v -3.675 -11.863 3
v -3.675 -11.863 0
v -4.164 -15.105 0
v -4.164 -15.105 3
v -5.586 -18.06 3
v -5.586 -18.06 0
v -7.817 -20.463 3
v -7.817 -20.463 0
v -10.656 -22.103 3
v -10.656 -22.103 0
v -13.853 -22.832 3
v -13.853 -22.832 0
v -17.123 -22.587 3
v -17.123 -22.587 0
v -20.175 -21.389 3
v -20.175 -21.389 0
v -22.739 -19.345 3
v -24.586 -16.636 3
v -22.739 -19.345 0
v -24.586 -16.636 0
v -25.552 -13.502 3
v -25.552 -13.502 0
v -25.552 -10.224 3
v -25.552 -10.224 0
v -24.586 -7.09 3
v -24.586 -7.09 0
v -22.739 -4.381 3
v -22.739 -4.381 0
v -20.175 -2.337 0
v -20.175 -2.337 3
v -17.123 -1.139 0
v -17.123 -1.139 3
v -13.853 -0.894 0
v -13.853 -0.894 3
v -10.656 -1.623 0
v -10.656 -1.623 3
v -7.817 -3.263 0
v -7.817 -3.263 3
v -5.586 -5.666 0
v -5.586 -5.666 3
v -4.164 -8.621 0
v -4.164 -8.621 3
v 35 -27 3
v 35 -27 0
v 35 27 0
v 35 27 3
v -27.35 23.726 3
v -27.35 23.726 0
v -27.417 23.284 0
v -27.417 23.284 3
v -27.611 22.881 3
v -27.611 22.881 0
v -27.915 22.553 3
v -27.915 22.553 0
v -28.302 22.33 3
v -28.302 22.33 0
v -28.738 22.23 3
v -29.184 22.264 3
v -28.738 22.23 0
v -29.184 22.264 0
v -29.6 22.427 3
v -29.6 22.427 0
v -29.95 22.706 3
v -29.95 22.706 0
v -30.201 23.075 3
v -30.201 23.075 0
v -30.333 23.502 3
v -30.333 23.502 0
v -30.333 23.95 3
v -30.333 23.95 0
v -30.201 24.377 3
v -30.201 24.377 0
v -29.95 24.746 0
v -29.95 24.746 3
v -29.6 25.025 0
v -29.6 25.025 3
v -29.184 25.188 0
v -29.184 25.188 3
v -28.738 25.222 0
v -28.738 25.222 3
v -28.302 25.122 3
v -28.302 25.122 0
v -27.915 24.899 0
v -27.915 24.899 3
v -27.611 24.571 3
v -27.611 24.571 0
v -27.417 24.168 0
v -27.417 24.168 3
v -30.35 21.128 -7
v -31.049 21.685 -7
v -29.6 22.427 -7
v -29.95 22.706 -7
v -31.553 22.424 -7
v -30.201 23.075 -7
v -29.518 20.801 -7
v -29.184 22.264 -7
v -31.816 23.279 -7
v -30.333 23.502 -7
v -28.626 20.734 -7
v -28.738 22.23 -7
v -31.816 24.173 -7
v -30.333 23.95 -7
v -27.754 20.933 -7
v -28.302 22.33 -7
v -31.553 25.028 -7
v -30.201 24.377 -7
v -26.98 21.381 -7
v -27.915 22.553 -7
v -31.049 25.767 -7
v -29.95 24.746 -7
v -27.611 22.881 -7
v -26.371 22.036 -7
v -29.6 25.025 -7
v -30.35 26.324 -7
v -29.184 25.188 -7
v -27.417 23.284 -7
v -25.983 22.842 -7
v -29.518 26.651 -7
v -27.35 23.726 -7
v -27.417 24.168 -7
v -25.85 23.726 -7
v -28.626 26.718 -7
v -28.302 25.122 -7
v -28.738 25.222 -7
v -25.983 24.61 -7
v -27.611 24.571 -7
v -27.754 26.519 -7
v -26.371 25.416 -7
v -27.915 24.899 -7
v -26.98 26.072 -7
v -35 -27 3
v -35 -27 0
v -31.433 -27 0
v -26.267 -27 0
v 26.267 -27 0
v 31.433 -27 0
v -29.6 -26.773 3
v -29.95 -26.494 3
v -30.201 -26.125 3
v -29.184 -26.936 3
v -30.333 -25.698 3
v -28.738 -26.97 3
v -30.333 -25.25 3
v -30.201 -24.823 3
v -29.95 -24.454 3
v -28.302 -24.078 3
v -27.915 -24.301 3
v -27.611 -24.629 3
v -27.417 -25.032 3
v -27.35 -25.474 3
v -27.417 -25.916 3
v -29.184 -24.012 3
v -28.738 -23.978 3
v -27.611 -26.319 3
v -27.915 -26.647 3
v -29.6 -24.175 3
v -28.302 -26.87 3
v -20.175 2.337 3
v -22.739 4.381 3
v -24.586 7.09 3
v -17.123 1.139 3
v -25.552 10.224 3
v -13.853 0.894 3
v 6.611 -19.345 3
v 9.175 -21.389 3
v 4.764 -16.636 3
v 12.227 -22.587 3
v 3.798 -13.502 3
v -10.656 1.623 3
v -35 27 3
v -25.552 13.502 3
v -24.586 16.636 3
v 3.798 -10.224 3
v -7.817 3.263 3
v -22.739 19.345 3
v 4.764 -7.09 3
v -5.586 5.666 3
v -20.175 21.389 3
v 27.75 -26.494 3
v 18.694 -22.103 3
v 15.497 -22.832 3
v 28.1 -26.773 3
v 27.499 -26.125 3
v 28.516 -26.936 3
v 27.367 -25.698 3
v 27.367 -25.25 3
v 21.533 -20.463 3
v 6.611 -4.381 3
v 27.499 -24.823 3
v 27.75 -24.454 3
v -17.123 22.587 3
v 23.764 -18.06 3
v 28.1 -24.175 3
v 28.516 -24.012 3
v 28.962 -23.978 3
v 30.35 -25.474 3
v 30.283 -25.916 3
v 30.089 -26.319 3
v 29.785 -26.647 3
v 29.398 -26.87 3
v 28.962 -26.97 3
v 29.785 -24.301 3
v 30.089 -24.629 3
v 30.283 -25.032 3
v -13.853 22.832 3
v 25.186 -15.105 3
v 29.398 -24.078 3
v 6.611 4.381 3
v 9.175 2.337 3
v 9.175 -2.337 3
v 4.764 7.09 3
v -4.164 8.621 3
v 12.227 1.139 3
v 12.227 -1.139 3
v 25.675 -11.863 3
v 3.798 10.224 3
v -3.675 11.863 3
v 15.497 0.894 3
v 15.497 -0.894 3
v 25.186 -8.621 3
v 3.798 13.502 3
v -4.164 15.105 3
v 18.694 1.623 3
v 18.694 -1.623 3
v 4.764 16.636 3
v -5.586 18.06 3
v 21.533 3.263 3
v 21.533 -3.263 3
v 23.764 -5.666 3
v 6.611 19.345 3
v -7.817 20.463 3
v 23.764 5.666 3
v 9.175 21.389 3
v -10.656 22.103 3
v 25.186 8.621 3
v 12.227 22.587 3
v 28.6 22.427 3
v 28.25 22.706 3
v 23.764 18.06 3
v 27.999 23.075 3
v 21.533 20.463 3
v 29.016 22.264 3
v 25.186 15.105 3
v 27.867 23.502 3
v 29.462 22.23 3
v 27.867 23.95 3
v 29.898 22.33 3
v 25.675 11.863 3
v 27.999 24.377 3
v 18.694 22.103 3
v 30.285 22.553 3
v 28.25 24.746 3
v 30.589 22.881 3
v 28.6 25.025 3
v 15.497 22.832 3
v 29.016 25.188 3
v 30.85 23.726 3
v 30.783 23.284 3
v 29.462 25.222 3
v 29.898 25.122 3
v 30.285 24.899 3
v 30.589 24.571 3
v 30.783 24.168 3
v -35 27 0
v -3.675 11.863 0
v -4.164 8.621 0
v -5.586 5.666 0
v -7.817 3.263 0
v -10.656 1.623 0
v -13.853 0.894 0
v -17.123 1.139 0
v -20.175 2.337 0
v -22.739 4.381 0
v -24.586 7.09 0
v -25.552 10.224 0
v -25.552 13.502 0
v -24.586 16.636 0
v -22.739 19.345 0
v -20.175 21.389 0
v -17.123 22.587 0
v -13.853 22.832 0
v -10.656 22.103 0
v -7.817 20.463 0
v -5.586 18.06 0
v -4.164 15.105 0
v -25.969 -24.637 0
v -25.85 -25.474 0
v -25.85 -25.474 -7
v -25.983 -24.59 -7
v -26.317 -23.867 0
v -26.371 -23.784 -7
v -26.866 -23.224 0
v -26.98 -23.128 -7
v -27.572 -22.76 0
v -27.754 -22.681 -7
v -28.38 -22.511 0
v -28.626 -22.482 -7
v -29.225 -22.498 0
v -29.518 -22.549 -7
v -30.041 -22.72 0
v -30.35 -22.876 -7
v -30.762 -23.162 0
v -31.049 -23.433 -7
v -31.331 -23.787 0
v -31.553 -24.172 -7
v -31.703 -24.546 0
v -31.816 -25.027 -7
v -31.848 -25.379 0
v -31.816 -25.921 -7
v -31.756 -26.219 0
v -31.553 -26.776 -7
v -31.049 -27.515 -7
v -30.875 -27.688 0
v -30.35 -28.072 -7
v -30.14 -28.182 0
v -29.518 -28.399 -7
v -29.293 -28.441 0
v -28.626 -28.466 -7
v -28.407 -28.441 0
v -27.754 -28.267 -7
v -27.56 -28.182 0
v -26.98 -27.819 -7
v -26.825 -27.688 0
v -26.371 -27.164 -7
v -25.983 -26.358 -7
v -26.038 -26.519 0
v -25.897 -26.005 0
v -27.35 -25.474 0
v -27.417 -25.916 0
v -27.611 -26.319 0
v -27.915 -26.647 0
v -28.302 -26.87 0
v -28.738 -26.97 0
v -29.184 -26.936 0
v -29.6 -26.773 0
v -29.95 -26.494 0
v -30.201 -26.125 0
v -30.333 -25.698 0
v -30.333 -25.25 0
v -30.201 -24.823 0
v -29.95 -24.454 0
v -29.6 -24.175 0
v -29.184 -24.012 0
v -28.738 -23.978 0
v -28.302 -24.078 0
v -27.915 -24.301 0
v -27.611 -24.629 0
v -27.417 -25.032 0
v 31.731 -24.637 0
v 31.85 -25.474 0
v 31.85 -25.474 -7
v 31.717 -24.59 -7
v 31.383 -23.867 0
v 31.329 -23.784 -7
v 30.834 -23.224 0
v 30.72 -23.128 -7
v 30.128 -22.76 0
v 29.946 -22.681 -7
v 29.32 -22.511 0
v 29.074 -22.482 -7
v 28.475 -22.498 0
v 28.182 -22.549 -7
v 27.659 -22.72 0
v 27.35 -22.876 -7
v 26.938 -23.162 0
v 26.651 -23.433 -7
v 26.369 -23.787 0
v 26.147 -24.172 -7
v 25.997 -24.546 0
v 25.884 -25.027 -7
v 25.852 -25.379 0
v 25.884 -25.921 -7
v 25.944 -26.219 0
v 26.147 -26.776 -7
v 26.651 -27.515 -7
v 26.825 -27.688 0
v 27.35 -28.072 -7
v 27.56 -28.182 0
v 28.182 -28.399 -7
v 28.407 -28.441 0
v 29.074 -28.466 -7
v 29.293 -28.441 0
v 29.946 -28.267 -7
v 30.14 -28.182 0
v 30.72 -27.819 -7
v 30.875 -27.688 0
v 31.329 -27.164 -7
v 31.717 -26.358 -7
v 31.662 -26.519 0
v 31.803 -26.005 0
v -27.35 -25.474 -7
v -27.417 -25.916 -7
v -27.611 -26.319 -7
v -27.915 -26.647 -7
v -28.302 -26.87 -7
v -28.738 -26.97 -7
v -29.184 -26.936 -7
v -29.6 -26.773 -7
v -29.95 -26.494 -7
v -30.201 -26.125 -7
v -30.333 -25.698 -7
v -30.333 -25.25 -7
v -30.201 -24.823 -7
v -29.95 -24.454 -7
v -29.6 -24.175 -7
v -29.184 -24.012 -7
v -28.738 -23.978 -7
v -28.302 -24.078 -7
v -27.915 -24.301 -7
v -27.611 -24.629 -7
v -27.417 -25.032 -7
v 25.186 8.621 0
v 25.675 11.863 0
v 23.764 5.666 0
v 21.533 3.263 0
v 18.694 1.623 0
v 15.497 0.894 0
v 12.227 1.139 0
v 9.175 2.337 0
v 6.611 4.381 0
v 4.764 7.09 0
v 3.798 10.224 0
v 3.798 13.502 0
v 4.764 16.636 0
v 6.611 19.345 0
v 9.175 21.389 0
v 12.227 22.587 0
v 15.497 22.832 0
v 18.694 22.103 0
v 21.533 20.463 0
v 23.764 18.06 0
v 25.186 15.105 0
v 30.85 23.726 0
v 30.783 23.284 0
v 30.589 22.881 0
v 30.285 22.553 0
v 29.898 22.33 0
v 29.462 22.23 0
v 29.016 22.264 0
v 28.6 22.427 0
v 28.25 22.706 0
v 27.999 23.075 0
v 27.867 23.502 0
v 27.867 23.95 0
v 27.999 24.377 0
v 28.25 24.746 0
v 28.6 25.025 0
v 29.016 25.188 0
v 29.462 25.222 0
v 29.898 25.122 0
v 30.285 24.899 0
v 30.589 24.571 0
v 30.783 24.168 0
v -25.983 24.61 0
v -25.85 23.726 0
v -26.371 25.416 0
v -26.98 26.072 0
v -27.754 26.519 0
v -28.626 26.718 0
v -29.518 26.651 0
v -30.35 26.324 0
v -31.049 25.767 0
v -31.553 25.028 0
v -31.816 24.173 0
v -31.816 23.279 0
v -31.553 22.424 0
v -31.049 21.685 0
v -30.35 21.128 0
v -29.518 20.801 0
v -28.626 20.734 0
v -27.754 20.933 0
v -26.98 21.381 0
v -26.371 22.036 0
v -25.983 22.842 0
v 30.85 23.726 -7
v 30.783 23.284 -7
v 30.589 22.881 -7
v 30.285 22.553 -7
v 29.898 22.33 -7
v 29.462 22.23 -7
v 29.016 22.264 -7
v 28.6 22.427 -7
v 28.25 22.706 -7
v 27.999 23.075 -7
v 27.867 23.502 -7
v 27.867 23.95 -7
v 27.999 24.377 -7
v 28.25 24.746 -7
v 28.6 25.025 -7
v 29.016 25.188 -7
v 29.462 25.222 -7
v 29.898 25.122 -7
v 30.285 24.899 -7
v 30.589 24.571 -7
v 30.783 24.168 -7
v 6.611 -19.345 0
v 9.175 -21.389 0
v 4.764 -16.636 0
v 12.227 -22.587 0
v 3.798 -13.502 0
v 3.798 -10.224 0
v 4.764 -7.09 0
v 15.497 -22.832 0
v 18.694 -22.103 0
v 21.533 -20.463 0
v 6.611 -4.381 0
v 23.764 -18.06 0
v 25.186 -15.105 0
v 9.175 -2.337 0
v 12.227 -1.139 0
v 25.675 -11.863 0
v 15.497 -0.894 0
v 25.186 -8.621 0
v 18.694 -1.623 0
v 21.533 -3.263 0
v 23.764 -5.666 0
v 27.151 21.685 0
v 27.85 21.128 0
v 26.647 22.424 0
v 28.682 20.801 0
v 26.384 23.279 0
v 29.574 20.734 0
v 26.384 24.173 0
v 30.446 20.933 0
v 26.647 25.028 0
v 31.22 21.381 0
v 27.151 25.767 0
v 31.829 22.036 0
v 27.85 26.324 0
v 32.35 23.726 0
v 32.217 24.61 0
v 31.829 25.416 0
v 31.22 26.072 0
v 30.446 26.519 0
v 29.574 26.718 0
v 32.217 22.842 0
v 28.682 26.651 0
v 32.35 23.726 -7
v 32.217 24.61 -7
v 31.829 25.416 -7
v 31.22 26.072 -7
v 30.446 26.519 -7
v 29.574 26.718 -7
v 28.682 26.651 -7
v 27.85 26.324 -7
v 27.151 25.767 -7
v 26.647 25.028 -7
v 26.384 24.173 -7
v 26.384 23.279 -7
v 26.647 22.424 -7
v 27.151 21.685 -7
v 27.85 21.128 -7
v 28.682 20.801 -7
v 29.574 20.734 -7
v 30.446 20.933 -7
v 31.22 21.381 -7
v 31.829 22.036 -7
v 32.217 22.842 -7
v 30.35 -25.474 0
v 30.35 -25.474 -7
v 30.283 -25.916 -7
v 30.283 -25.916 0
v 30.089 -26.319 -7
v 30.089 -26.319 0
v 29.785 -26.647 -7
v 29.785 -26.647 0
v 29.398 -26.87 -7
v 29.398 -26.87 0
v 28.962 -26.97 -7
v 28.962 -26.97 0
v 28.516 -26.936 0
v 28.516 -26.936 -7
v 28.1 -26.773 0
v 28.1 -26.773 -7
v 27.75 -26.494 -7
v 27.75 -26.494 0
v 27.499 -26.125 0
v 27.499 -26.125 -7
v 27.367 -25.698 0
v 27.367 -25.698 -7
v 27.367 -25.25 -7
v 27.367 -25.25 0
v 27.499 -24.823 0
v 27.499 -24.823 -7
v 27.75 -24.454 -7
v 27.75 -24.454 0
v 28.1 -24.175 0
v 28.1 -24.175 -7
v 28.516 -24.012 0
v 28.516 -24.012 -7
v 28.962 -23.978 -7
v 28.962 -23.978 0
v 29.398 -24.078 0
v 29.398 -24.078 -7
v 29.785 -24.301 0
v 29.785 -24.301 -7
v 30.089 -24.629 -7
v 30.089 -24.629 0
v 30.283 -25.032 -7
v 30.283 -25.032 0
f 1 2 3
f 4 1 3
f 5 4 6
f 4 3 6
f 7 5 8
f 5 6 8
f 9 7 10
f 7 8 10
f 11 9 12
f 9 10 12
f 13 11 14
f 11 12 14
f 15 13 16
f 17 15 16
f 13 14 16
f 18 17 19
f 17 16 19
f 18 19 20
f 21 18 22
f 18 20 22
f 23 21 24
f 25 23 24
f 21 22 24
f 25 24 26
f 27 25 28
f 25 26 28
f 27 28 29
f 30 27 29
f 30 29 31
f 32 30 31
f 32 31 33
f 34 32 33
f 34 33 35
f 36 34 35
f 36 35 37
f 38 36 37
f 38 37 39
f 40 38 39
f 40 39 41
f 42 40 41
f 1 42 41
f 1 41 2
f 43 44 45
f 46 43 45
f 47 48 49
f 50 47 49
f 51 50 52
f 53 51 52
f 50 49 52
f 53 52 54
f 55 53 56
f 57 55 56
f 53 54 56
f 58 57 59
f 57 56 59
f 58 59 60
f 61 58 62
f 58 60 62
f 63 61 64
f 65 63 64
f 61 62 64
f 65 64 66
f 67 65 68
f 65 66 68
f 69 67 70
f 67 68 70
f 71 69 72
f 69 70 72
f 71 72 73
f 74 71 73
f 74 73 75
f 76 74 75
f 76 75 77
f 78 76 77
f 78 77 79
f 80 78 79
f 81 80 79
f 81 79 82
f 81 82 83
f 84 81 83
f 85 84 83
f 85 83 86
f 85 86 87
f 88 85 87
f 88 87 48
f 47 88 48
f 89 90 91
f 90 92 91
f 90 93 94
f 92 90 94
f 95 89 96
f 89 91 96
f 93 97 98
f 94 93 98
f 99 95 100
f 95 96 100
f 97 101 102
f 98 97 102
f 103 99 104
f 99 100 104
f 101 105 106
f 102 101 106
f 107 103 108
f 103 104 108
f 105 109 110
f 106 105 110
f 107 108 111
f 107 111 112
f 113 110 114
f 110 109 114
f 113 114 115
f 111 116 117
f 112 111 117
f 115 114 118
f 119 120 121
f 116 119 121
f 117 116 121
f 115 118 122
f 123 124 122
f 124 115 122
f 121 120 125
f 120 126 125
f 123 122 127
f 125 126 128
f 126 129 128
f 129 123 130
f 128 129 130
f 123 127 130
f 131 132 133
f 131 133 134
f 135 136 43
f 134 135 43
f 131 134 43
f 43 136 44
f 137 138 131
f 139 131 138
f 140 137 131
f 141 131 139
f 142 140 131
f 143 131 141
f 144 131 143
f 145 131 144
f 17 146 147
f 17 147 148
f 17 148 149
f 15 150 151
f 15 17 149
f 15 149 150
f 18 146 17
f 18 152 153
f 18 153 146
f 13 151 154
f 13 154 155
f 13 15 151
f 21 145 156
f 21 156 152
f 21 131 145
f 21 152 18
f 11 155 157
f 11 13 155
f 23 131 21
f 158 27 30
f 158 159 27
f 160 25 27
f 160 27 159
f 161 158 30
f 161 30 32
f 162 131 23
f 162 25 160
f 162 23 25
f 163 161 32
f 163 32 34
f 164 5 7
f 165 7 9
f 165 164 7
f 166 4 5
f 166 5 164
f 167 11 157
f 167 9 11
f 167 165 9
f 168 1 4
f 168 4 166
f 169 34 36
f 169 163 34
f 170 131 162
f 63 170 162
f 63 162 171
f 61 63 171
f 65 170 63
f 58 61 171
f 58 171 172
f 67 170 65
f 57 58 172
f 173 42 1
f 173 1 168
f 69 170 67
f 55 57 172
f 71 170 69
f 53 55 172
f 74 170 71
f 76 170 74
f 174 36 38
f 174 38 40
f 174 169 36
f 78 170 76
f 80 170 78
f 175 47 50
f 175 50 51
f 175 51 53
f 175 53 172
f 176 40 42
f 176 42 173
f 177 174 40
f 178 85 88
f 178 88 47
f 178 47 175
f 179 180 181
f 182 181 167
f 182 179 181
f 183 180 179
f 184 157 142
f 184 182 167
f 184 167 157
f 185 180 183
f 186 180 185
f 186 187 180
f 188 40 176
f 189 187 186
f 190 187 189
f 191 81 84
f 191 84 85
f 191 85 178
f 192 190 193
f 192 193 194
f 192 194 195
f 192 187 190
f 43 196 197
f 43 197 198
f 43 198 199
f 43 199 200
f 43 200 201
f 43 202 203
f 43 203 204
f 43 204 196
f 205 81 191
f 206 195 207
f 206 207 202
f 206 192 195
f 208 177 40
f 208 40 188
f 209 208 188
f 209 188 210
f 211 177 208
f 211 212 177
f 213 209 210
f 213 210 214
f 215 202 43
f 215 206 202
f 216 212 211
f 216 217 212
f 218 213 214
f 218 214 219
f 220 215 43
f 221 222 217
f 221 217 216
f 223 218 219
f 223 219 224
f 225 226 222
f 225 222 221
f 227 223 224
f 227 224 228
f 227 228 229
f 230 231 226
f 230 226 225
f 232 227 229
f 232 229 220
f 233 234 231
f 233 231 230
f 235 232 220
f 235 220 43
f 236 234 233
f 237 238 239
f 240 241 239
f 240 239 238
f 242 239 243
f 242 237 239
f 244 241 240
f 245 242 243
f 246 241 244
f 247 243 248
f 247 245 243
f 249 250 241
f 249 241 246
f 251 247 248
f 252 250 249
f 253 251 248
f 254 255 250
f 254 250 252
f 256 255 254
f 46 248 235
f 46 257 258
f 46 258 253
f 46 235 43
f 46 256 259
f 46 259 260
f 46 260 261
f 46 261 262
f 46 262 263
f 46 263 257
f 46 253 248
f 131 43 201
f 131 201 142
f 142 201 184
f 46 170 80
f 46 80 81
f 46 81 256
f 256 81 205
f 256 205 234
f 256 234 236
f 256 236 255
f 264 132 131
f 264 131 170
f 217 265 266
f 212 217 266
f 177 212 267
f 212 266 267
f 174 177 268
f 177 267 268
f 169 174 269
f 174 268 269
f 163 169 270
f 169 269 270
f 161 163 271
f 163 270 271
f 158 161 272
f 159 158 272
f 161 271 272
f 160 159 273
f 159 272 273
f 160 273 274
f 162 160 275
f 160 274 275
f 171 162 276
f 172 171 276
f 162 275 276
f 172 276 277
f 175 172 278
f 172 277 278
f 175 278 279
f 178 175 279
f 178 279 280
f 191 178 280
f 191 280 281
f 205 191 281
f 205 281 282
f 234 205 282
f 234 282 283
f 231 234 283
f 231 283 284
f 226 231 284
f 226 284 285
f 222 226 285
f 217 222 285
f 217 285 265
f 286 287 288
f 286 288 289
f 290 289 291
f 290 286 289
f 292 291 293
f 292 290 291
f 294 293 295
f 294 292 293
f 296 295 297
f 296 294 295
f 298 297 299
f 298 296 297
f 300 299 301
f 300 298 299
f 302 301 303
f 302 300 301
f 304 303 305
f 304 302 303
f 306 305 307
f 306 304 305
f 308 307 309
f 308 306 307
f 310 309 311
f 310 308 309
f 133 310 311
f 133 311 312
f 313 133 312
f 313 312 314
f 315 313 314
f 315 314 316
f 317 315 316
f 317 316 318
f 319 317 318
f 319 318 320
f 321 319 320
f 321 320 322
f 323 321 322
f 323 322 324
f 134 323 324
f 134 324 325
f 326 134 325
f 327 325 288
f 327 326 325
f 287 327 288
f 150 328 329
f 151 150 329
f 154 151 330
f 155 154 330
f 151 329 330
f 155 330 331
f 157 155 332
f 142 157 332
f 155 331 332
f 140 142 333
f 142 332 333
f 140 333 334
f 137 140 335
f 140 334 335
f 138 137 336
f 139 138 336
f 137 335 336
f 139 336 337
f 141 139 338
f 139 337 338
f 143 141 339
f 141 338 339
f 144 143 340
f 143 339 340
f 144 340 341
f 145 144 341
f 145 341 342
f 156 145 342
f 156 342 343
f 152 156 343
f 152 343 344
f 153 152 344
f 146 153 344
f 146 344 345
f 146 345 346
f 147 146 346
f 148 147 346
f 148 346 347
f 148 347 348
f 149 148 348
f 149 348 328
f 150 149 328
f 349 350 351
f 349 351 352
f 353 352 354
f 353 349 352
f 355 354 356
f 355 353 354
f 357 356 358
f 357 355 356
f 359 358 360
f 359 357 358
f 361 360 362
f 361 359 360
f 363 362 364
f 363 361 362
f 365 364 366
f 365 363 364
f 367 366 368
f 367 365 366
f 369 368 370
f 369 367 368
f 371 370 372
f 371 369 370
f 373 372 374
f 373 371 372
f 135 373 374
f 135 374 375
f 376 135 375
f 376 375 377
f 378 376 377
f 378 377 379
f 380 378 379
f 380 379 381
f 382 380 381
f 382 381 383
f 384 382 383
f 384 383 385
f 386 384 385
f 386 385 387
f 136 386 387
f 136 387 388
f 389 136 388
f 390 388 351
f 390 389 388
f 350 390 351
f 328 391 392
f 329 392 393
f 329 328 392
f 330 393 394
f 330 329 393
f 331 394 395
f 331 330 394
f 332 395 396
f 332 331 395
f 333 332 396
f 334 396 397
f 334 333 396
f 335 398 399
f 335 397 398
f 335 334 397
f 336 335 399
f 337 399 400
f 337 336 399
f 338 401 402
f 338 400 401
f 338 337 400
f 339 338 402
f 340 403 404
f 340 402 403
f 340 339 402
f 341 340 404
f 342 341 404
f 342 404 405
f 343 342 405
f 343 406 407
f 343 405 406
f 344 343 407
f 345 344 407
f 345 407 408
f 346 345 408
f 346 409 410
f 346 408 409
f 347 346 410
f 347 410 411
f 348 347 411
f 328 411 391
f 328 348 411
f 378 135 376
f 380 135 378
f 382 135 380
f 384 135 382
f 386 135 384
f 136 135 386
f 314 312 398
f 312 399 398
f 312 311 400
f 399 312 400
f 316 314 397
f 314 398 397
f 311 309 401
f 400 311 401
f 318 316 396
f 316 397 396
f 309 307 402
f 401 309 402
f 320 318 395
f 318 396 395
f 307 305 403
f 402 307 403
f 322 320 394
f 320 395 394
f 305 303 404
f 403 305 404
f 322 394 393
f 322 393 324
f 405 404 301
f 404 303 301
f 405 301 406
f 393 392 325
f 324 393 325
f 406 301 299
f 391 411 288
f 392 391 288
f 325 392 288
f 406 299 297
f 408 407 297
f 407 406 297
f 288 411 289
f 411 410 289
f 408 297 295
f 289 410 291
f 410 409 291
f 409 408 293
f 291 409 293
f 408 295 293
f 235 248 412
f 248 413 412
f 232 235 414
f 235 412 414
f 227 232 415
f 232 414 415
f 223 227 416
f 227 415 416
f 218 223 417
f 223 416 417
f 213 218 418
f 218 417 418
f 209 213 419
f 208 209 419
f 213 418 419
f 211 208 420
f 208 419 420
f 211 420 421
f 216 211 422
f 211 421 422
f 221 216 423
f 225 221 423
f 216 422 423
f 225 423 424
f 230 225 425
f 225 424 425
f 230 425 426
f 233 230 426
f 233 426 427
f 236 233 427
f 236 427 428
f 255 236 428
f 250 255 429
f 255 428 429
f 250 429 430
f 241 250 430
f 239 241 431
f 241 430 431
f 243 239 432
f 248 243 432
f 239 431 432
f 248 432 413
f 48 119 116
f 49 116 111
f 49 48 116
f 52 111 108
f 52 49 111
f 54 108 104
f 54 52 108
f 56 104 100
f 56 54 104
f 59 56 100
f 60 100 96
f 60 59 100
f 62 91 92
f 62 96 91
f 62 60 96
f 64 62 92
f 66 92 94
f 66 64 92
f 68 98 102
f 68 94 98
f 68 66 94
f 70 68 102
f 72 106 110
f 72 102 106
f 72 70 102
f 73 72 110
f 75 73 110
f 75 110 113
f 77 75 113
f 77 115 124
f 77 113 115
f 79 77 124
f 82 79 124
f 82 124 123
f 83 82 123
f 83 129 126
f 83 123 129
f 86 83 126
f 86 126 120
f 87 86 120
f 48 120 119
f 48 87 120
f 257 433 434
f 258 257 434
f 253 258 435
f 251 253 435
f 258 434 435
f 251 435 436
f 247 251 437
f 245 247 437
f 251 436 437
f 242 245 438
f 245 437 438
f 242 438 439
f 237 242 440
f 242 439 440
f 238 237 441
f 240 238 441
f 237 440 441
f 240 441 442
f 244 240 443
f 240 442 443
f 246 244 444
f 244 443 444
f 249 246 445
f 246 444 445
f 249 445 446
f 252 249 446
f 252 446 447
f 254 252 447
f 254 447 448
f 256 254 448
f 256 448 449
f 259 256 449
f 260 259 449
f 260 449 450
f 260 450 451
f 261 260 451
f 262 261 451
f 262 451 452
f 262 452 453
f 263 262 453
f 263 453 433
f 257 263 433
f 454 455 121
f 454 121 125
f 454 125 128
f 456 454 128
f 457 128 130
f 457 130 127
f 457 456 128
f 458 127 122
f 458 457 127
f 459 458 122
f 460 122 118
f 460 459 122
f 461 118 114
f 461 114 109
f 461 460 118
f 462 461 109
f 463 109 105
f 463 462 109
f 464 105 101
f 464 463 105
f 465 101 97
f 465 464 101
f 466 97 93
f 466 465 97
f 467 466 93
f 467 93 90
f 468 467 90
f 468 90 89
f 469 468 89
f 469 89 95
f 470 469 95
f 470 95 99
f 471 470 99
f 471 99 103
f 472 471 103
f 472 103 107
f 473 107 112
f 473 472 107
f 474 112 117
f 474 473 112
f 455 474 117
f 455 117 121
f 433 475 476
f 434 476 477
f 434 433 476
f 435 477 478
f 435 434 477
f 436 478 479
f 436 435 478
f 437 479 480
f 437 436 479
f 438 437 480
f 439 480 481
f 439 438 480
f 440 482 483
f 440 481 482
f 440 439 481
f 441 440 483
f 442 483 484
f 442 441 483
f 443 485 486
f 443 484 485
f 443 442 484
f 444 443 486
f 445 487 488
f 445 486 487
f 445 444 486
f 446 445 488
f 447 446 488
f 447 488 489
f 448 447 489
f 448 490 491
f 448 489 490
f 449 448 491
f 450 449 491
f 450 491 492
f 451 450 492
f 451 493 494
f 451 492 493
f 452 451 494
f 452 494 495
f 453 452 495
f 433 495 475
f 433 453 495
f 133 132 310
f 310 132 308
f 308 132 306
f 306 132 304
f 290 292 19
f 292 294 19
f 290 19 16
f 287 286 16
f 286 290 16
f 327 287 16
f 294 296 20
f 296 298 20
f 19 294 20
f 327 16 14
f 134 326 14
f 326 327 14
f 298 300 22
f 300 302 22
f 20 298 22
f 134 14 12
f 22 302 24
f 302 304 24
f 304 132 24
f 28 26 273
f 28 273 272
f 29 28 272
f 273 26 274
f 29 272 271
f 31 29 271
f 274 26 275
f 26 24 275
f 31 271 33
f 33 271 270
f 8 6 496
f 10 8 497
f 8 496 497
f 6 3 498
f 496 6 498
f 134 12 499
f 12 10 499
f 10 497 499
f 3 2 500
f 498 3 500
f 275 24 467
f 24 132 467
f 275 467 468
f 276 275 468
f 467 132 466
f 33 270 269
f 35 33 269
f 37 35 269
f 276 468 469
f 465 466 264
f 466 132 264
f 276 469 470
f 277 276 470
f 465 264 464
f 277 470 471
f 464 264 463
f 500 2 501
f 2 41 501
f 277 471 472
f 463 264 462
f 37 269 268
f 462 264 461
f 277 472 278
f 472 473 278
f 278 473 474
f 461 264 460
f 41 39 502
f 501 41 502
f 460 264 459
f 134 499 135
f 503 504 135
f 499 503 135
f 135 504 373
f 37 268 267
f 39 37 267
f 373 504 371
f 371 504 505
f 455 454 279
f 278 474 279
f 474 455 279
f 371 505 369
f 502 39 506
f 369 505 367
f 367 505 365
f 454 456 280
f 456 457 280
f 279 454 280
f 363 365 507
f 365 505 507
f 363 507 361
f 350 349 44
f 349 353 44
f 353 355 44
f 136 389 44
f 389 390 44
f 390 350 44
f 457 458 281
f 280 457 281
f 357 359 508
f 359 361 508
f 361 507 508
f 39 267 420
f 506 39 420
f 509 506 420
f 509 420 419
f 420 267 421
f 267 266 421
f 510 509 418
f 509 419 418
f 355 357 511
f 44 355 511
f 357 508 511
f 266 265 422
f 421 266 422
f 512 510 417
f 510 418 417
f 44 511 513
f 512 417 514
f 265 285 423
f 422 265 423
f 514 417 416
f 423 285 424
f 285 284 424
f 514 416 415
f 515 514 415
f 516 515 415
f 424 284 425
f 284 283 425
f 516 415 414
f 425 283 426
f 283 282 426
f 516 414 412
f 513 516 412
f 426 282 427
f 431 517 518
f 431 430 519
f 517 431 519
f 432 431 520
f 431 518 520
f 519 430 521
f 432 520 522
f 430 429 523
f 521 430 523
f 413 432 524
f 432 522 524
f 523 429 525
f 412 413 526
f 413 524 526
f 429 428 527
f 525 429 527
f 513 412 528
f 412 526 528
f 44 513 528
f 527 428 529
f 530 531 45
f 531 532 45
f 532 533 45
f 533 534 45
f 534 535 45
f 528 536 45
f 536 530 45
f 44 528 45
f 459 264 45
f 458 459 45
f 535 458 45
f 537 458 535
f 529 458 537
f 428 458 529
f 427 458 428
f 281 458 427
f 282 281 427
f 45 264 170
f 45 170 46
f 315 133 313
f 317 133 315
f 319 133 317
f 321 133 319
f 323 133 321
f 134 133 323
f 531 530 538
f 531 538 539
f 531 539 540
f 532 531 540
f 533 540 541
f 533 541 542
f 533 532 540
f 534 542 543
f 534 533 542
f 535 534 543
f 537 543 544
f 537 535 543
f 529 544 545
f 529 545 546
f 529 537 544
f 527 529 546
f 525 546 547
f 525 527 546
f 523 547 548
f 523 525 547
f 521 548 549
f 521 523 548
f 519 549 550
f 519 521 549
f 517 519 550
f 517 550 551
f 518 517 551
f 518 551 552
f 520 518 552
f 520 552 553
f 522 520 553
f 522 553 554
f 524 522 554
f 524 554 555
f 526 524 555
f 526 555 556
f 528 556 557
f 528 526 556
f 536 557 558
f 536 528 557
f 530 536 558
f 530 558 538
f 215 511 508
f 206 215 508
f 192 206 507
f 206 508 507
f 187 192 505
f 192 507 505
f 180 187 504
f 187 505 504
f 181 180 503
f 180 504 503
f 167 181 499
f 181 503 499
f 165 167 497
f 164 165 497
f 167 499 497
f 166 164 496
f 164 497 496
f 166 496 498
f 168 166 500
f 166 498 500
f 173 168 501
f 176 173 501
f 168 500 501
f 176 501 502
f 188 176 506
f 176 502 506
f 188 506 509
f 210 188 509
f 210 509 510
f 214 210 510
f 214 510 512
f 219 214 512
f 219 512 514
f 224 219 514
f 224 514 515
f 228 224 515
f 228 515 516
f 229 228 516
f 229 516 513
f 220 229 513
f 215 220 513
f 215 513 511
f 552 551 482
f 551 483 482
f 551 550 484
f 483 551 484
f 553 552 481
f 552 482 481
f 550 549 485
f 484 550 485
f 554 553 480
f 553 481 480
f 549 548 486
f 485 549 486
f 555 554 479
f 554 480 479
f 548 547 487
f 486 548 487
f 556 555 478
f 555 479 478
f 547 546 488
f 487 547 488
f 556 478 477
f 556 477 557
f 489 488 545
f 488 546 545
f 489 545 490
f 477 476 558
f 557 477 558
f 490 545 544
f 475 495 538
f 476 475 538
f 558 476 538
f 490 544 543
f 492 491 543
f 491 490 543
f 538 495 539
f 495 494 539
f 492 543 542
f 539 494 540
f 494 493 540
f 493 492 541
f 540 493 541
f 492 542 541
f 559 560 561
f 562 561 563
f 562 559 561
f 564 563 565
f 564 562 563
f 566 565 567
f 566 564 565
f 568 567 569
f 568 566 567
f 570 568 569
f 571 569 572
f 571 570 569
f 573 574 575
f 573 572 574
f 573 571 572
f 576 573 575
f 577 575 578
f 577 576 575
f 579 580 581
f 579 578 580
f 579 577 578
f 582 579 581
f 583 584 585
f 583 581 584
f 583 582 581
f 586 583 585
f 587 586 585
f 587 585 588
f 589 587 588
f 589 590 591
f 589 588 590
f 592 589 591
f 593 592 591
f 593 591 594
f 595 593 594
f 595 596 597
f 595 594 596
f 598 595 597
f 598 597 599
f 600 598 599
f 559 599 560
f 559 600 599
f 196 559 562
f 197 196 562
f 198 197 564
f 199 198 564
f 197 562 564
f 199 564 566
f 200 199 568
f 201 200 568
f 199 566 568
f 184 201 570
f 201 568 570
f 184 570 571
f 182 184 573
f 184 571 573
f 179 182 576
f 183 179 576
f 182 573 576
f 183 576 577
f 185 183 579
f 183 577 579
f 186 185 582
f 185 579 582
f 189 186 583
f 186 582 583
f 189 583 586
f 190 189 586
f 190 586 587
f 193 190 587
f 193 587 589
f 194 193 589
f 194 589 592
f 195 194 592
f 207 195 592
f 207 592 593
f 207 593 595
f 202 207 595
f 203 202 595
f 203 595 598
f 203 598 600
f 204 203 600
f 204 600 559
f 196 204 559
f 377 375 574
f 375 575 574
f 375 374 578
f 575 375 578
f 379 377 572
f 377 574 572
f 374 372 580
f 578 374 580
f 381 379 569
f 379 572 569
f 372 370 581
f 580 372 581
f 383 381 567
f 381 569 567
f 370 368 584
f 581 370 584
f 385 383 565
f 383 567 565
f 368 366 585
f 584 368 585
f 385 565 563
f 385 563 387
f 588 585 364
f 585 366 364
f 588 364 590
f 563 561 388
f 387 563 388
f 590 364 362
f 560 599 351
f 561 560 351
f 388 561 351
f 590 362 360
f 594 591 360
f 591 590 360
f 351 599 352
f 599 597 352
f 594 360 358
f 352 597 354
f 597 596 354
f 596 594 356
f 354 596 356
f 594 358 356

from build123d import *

# Parameters (mm, degrees)
SKETCH002_R      = 1.5
SKETCH002_R_2    = 11
EXTRUDE002_DEPTH = 10
SKETCH001_R      = 3
EXTRUDE001_DEPTH = 7
SKETCH_W         = 70
SKETCH_H         = 54
EXTRUDE_DEPTH    = 3


with BuildPart() as extrude002:
    # Sketch002 (on Face5 of Extrude) → Extrude002 (new body, symmetric)
    with BuildSketch(Plane(origin=(0, 0, 0), x_dir=(1, 0, 0), z_dir=(0, 0, -1))):
        with Locations((-28.85, 25.473994)):
            Circle(SKETCH002_R)
        with Locations((28.85, 25.473994)):
            Circle(SKETCH002_R)
        with Locations((-28.85, -23.726006)):
            Circle(SKETCH002_R)
        with Locations((29.35, -23.726006)):
            Circle(SKETCH002_R)
        with Locations((-14.675, 11.863003)):
            Circle(SKETCH002_R_2)
        with Locations((-14.675, -11.863003)):
            Circle(SKETCH002_R_2)
        with Locations((14.675, 11.863003)):
            Circle(SKETCH002_R_2)
        with Locations((14.675, -11.863003)):
            Circle(SKETCH002_R_2)
    extrude(amount=EXTRUDE002_DEPTH, both=True)


with BuildPart() as extrude001:
    # Sketch001 (on Extrude) → Extrude001 (new body)
    with BuildSketch(Plane.XY):
        with Locations((-28.85, 23.726006)):
            Circle(SKETCH001_R)
        with Locations((29.35, 23.726006)):
            Circle(SKETCH001_R)
        with Locations((-28.85, -25.473994)):
            Circle(SKETCH001_R)
        with Locations((28.85, -25.473994)):
            Circle(SKETCH001_R)
    extrude(amount=-EXTRUDE001_DEPTH)


with BuildPart() as cut:
    # Sketch → Extrude (new body)
    with BuildSketch(Plane.XY):
        Rectangle(SKETCH_W, SKETCH_H)
    extrude(amount=EXTRUDE_DEPTH)

    # Fusion: union Extrude001
    add(extrude001.part)

    # Cut: cut Extrude002
    add(extrude002.part, mode=Mode.SUBTRACT)


solid = cut.part
